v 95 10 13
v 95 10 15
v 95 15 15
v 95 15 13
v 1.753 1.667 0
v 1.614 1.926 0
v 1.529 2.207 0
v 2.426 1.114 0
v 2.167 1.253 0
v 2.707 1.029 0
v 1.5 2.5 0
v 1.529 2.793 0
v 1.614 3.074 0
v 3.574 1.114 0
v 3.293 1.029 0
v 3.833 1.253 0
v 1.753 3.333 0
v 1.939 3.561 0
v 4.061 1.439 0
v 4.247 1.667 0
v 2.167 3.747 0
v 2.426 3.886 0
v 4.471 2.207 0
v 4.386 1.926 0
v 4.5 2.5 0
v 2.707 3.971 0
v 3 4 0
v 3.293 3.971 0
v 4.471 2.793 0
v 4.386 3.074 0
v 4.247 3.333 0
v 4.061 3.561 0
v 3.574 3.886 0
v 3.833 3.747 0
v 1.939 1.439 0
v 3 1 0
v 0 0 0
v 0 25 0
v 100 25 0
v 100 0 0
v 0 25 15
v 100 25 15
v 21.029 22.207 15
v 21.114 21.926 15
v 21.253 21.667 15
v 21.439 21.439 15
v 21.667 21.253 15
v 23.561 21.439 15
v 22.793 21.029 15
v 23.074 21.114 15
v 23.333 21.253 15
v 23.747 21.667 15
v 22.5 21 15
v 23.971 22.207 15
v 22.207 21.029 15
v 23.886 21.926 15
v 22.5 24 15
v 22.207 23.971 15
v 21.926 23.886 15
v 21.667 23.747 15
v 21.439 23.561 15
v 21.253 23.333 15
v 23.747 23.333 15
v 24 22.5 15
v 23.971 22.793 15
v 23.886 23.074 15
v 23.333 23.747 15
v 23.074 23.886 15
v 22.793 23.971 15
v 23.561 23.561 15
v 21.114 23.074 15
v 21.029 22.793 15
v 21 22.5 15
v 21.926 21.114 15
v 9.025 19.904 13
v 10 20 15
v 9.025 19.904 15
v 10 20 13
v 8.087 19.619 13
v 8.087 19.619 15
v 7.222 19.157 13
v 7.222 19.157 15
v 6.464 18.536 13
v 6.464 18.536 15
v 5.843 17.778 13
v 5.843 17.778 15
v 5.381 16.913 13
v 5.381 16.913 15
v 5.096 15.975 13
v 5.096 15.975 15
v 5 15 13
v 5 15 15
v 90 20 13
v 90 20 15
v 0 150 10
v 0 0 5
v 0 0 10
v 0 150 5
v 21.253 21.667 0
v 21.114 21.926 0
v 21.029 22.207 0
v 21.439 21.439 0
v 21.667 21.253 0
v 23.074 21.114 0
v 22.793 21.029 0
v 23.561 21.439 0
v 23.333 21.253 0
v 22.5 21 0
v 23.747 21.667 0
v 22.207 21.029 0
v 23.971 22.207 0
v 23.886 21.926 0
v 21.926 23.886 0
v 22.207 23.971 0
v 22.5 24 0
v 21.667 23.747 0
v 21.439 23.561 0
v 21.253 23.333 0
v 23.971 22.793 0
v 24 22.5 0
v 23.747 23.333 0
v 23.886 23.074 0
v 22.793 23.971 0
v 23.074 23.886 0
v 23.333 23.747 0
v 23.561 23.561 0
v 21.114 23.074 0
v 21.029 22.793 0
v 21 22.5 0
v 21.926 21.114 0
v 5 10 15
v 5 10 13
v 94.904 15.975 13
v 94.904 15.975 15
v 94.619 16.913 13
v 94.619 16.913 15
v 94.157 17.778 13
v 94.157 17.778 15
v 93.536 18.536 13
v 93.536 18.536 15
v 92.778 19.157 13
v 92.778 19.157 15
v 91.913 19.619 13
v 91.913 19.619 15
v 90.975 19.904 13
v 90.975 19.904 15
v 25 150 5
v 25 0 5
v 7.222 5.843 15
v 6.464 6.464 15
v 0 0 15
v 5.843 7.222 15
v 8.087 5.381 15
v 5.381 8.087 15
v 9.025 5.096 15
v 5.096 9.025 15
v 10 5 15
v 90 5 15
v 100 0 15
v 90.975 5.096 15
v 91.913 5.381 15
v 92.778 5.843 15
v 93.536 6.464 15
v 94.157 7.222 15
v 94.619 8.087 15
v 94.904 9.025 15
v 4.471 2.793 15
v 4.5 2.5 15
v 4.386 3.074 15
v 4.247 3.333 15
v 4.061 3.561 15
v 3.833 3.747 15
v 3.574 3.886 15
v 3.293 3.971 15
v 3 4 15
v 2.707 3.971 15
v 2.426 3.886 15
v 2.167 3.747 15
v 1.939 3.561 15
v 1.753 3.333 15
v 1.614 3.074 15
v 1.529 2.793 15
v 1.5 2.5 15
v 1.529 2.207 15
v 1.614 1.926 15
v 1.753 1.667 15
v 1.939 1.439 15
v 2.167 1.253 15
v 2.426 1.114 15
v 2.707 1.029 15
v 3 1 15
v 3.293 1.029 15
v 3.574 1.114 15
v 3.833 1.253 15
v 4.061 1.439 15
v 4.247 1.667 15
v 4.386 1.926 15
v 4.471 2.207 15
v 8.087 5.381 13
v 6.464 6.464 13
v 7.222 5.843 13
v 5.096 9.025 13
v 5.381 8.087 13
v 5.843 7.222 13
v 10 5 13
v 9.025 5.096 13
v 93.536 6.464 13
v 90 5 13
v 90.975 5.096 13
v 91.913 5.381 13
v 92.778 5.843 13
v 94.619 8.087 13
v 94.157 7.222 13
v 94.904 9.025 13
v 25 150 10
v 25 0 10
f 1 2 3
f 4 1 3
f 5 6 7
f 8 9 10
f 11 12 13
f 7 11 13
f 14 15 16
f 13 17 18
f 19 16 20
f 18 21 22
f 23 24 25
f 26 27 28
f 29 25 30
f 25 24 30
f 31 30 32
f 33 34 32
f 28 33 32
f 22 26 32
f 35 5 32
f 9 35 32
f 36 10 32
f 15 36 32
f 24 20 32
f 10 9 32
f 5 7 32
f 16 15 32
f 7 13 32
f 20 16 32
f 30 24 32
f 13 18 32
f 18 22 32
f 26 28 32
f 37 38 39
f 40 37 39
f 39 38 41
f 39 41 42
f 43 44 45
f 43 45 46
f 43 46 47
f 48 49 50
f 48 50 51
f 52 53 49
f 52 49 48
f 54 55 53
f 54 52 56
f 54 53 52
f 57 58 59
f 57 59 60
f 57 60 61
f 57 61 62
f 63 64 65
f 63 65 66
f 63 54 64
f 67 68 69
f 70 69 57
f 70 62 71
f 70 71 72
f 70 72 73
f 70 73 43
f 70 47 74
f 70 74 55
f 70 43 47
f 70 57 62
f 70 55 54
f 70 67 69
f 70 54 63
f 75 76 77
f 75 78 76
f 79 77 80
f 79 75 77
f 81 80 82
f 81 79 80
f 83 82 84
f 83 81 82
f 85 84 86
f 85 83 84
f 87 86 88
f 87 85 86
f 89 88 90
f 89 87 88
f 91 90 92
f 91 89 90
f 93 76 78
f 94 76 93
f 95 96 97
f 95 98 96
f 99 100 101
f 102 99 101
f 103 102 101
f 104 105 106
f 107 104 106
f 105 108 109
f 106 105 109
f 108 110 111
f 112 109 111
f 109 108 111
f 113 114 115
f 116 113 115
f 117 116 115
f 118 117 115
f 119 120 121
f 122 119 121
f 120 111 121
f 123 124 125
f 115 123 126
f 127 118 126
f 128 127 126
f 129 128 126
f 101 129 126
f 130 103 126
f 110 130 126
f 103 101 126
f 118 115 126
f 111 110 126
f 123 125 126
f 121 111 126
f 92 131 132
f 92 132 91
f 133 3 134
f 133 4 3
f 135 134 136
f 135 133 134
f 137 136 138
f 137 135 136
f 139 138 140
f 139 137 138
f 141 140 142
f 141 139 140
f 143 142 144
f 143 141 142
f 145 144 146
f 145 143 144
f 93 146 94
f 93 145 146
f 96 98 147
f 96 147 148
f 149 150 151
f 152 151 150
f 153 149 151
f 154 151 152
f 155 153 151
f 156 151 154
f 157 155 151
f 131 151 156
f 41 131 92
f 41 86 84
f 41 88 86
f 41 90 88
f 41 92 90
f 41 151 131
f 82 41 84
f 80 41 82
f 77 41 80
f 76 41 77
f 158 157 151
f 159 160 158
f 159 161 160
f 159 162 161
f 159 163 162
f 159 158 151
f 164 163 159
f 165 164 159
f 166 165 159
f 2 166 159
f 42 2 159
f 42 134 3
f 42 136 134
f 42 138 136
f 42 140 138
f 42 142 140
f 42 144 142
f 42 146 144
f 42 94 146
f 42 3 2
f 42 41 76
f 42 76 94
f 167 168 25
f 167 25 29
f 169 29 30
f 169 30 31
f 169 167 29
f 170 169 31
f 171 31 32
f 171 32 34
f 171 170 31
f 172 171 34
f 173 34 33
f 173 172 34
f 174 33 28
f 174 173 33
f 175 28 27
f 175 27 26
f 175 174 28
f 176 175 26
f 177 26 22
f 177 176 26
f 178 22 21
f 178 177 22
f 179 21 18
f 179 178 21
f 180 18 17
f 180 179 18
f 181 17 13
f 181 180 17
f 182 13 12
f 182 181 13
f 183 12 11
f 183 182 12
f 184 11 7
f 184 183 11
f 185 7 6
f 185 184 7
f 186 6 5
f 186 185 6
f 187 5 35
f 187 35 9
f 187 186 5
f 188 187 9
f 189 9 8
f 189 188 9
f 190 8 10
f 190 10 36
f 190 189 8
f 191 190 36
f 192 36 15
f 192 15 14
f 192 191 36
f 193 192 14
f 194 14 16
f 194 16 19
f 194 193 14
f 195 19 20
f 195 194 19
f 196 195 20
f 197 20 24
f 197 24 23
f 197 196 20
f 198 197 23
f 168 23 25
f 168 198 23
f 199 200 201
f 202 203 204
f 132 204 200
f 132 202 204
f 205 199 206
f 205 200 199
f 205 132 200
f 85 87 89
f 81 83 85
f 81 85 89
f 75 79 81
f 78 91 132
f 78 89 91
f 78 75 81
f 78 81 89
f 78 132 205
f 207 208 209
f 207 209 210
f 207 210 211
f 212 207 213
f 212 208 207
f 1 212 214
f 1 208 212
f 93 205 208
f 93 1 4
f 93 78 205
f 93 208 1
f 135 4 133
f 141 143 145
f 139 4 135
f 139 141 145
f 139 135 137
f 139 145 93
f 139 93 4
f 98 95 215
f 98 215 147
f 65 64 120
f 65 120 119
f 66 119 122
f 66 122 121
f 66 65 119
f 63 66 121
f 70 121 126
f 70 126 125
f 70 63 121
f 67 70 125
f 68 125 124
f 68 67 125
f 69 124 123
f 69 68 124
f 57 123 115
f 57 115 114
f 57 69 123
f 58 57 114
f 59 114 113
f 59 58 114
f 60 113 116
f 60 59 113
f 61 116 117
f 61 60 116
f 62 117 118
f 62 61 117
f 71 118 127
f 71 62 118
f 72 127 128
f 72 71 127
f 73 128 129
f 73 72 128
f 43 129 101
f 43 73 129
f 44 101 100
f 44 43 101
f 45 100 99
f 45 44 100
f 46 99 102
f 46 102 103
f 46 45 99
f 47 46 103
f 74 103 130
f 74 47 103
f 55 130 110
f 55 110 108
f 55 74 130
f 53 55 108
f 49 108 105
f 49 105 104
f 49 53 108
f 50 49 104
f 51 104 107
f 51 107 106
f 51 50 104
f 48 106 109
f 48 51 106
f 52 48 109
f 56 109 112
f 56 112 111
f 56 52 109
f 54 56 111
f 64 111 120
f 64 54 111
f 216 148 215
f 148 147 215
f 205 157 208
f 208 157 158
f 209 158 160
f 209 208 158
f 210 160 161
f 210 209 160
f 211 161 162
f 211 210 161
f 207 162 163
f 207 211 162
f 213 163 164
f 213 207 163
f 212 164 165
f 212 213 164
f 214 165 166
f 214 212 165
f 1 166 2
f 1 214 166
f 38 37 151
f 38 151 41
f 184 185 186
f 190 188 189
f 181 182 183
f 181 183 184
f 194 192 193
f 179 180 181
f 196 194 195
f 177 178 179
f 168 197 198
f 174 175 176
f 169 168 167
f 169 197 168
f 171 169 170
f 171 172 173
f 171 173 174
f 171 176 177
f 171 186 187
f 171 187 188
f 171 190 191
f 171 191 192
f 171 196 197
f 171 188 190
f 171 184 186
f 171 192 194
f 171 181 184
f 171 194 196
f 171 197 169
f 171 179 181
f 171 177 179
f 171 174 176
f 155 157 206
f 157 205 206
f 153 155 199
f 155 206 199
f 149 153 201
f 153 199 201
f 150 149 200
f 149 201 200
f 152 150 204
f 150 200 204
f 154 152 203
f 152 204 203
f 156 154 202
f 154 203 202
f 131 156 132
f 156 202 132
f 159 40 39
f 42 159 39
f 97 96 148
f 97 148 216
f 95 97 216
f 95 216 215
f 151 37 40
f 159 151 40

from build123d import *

# Parameters (mm, degrees)
ESQUISSE1_W             = 100
ESQUISSE1_H             = 25
BOSS_EXTRU_1_DEPTH      = 15
BOSS_EXTRU_2_DEPTH      = 25
ESQUISSE3_W             = 90
ESQUISSE3_H             = 15
ENL_V_MAT_EXTRU_1_DEPTH = 2
CONG_1_R                = 5
ESQUISSE4_R             = 1.5
BOSS_EXTRU_3_DEPTH      = 15
BOSS_EXTRU_3_2_DEPTH    = 15


with BuildPart() as part:
    # Esquisse1 → Boss.-Extru.1 (new body)
    with BuildSketch(Plane.XY):
        with Locations((50, 12.5)):
            Rectangle(ESQUISSE1_W, ESQUISSE1_H)
    extrude(amount=BOSS_EXTRU_1_DEPTH)

    # Esquisse3 → Enlèv. mat.-Extru.1 (cut)
    with BuildSketch(Plane.XY.offset(15)):
        with Locations((50, 12.5)):
            Rectangle(ESQUISSE3_W, ESQUISSE3_H)
    extrude(amount=-ENL_V_MAT_EXTRU_1_DEPTH, mode=Mode.SUBTRACT)

    # Congé1
    cong_1_edges = [part.edges().sort_by_distance(p)[0] for p in [
        (5, 5, 14),
        (5, 20, 14),
        (95, 20, 14),
        (95, 5, 14),
    ]]
    fillet(cong_1_edges, radius=CONG_1_R)


with BuildPart() as body_2:
    # Esquisse2 → Boss.-Extru.2 (new body)
    with BuildSketch(Plane.ZY):
        Polygon((5, 0), (10, 0), (10, 25), (10, 150), (5, 150), (5, 25), align=None)
    extrude(amount=-BOSS_EXTRU_2_DEPTH)


with BuildPart() as body_3:
    # Esquisse4 → Boss.-Extru.3 (new body)
    with BuildSketch(Plane.XY.offset(15)):
        with Locations((22.5, 22.5)):
            Circle(ESQUISSE4_R)
    extrude(amount=-BOSS_EXTRU_3_DEPTH)


with BuildPart() as body_4:
    # Esquisse4 → Boss.-Extru.3 2 (new body)
    with BuildSketch(Plane.XY.offset(15)):
        with Locations((3, 2.5)):
            Circle(ESQUISSE4_R)
    extrude(amount=-BOSS_EXTRU_3_2_DEPTH)


solid = Compound([part.part, body_2.part, body_3.part, body_4.part])
